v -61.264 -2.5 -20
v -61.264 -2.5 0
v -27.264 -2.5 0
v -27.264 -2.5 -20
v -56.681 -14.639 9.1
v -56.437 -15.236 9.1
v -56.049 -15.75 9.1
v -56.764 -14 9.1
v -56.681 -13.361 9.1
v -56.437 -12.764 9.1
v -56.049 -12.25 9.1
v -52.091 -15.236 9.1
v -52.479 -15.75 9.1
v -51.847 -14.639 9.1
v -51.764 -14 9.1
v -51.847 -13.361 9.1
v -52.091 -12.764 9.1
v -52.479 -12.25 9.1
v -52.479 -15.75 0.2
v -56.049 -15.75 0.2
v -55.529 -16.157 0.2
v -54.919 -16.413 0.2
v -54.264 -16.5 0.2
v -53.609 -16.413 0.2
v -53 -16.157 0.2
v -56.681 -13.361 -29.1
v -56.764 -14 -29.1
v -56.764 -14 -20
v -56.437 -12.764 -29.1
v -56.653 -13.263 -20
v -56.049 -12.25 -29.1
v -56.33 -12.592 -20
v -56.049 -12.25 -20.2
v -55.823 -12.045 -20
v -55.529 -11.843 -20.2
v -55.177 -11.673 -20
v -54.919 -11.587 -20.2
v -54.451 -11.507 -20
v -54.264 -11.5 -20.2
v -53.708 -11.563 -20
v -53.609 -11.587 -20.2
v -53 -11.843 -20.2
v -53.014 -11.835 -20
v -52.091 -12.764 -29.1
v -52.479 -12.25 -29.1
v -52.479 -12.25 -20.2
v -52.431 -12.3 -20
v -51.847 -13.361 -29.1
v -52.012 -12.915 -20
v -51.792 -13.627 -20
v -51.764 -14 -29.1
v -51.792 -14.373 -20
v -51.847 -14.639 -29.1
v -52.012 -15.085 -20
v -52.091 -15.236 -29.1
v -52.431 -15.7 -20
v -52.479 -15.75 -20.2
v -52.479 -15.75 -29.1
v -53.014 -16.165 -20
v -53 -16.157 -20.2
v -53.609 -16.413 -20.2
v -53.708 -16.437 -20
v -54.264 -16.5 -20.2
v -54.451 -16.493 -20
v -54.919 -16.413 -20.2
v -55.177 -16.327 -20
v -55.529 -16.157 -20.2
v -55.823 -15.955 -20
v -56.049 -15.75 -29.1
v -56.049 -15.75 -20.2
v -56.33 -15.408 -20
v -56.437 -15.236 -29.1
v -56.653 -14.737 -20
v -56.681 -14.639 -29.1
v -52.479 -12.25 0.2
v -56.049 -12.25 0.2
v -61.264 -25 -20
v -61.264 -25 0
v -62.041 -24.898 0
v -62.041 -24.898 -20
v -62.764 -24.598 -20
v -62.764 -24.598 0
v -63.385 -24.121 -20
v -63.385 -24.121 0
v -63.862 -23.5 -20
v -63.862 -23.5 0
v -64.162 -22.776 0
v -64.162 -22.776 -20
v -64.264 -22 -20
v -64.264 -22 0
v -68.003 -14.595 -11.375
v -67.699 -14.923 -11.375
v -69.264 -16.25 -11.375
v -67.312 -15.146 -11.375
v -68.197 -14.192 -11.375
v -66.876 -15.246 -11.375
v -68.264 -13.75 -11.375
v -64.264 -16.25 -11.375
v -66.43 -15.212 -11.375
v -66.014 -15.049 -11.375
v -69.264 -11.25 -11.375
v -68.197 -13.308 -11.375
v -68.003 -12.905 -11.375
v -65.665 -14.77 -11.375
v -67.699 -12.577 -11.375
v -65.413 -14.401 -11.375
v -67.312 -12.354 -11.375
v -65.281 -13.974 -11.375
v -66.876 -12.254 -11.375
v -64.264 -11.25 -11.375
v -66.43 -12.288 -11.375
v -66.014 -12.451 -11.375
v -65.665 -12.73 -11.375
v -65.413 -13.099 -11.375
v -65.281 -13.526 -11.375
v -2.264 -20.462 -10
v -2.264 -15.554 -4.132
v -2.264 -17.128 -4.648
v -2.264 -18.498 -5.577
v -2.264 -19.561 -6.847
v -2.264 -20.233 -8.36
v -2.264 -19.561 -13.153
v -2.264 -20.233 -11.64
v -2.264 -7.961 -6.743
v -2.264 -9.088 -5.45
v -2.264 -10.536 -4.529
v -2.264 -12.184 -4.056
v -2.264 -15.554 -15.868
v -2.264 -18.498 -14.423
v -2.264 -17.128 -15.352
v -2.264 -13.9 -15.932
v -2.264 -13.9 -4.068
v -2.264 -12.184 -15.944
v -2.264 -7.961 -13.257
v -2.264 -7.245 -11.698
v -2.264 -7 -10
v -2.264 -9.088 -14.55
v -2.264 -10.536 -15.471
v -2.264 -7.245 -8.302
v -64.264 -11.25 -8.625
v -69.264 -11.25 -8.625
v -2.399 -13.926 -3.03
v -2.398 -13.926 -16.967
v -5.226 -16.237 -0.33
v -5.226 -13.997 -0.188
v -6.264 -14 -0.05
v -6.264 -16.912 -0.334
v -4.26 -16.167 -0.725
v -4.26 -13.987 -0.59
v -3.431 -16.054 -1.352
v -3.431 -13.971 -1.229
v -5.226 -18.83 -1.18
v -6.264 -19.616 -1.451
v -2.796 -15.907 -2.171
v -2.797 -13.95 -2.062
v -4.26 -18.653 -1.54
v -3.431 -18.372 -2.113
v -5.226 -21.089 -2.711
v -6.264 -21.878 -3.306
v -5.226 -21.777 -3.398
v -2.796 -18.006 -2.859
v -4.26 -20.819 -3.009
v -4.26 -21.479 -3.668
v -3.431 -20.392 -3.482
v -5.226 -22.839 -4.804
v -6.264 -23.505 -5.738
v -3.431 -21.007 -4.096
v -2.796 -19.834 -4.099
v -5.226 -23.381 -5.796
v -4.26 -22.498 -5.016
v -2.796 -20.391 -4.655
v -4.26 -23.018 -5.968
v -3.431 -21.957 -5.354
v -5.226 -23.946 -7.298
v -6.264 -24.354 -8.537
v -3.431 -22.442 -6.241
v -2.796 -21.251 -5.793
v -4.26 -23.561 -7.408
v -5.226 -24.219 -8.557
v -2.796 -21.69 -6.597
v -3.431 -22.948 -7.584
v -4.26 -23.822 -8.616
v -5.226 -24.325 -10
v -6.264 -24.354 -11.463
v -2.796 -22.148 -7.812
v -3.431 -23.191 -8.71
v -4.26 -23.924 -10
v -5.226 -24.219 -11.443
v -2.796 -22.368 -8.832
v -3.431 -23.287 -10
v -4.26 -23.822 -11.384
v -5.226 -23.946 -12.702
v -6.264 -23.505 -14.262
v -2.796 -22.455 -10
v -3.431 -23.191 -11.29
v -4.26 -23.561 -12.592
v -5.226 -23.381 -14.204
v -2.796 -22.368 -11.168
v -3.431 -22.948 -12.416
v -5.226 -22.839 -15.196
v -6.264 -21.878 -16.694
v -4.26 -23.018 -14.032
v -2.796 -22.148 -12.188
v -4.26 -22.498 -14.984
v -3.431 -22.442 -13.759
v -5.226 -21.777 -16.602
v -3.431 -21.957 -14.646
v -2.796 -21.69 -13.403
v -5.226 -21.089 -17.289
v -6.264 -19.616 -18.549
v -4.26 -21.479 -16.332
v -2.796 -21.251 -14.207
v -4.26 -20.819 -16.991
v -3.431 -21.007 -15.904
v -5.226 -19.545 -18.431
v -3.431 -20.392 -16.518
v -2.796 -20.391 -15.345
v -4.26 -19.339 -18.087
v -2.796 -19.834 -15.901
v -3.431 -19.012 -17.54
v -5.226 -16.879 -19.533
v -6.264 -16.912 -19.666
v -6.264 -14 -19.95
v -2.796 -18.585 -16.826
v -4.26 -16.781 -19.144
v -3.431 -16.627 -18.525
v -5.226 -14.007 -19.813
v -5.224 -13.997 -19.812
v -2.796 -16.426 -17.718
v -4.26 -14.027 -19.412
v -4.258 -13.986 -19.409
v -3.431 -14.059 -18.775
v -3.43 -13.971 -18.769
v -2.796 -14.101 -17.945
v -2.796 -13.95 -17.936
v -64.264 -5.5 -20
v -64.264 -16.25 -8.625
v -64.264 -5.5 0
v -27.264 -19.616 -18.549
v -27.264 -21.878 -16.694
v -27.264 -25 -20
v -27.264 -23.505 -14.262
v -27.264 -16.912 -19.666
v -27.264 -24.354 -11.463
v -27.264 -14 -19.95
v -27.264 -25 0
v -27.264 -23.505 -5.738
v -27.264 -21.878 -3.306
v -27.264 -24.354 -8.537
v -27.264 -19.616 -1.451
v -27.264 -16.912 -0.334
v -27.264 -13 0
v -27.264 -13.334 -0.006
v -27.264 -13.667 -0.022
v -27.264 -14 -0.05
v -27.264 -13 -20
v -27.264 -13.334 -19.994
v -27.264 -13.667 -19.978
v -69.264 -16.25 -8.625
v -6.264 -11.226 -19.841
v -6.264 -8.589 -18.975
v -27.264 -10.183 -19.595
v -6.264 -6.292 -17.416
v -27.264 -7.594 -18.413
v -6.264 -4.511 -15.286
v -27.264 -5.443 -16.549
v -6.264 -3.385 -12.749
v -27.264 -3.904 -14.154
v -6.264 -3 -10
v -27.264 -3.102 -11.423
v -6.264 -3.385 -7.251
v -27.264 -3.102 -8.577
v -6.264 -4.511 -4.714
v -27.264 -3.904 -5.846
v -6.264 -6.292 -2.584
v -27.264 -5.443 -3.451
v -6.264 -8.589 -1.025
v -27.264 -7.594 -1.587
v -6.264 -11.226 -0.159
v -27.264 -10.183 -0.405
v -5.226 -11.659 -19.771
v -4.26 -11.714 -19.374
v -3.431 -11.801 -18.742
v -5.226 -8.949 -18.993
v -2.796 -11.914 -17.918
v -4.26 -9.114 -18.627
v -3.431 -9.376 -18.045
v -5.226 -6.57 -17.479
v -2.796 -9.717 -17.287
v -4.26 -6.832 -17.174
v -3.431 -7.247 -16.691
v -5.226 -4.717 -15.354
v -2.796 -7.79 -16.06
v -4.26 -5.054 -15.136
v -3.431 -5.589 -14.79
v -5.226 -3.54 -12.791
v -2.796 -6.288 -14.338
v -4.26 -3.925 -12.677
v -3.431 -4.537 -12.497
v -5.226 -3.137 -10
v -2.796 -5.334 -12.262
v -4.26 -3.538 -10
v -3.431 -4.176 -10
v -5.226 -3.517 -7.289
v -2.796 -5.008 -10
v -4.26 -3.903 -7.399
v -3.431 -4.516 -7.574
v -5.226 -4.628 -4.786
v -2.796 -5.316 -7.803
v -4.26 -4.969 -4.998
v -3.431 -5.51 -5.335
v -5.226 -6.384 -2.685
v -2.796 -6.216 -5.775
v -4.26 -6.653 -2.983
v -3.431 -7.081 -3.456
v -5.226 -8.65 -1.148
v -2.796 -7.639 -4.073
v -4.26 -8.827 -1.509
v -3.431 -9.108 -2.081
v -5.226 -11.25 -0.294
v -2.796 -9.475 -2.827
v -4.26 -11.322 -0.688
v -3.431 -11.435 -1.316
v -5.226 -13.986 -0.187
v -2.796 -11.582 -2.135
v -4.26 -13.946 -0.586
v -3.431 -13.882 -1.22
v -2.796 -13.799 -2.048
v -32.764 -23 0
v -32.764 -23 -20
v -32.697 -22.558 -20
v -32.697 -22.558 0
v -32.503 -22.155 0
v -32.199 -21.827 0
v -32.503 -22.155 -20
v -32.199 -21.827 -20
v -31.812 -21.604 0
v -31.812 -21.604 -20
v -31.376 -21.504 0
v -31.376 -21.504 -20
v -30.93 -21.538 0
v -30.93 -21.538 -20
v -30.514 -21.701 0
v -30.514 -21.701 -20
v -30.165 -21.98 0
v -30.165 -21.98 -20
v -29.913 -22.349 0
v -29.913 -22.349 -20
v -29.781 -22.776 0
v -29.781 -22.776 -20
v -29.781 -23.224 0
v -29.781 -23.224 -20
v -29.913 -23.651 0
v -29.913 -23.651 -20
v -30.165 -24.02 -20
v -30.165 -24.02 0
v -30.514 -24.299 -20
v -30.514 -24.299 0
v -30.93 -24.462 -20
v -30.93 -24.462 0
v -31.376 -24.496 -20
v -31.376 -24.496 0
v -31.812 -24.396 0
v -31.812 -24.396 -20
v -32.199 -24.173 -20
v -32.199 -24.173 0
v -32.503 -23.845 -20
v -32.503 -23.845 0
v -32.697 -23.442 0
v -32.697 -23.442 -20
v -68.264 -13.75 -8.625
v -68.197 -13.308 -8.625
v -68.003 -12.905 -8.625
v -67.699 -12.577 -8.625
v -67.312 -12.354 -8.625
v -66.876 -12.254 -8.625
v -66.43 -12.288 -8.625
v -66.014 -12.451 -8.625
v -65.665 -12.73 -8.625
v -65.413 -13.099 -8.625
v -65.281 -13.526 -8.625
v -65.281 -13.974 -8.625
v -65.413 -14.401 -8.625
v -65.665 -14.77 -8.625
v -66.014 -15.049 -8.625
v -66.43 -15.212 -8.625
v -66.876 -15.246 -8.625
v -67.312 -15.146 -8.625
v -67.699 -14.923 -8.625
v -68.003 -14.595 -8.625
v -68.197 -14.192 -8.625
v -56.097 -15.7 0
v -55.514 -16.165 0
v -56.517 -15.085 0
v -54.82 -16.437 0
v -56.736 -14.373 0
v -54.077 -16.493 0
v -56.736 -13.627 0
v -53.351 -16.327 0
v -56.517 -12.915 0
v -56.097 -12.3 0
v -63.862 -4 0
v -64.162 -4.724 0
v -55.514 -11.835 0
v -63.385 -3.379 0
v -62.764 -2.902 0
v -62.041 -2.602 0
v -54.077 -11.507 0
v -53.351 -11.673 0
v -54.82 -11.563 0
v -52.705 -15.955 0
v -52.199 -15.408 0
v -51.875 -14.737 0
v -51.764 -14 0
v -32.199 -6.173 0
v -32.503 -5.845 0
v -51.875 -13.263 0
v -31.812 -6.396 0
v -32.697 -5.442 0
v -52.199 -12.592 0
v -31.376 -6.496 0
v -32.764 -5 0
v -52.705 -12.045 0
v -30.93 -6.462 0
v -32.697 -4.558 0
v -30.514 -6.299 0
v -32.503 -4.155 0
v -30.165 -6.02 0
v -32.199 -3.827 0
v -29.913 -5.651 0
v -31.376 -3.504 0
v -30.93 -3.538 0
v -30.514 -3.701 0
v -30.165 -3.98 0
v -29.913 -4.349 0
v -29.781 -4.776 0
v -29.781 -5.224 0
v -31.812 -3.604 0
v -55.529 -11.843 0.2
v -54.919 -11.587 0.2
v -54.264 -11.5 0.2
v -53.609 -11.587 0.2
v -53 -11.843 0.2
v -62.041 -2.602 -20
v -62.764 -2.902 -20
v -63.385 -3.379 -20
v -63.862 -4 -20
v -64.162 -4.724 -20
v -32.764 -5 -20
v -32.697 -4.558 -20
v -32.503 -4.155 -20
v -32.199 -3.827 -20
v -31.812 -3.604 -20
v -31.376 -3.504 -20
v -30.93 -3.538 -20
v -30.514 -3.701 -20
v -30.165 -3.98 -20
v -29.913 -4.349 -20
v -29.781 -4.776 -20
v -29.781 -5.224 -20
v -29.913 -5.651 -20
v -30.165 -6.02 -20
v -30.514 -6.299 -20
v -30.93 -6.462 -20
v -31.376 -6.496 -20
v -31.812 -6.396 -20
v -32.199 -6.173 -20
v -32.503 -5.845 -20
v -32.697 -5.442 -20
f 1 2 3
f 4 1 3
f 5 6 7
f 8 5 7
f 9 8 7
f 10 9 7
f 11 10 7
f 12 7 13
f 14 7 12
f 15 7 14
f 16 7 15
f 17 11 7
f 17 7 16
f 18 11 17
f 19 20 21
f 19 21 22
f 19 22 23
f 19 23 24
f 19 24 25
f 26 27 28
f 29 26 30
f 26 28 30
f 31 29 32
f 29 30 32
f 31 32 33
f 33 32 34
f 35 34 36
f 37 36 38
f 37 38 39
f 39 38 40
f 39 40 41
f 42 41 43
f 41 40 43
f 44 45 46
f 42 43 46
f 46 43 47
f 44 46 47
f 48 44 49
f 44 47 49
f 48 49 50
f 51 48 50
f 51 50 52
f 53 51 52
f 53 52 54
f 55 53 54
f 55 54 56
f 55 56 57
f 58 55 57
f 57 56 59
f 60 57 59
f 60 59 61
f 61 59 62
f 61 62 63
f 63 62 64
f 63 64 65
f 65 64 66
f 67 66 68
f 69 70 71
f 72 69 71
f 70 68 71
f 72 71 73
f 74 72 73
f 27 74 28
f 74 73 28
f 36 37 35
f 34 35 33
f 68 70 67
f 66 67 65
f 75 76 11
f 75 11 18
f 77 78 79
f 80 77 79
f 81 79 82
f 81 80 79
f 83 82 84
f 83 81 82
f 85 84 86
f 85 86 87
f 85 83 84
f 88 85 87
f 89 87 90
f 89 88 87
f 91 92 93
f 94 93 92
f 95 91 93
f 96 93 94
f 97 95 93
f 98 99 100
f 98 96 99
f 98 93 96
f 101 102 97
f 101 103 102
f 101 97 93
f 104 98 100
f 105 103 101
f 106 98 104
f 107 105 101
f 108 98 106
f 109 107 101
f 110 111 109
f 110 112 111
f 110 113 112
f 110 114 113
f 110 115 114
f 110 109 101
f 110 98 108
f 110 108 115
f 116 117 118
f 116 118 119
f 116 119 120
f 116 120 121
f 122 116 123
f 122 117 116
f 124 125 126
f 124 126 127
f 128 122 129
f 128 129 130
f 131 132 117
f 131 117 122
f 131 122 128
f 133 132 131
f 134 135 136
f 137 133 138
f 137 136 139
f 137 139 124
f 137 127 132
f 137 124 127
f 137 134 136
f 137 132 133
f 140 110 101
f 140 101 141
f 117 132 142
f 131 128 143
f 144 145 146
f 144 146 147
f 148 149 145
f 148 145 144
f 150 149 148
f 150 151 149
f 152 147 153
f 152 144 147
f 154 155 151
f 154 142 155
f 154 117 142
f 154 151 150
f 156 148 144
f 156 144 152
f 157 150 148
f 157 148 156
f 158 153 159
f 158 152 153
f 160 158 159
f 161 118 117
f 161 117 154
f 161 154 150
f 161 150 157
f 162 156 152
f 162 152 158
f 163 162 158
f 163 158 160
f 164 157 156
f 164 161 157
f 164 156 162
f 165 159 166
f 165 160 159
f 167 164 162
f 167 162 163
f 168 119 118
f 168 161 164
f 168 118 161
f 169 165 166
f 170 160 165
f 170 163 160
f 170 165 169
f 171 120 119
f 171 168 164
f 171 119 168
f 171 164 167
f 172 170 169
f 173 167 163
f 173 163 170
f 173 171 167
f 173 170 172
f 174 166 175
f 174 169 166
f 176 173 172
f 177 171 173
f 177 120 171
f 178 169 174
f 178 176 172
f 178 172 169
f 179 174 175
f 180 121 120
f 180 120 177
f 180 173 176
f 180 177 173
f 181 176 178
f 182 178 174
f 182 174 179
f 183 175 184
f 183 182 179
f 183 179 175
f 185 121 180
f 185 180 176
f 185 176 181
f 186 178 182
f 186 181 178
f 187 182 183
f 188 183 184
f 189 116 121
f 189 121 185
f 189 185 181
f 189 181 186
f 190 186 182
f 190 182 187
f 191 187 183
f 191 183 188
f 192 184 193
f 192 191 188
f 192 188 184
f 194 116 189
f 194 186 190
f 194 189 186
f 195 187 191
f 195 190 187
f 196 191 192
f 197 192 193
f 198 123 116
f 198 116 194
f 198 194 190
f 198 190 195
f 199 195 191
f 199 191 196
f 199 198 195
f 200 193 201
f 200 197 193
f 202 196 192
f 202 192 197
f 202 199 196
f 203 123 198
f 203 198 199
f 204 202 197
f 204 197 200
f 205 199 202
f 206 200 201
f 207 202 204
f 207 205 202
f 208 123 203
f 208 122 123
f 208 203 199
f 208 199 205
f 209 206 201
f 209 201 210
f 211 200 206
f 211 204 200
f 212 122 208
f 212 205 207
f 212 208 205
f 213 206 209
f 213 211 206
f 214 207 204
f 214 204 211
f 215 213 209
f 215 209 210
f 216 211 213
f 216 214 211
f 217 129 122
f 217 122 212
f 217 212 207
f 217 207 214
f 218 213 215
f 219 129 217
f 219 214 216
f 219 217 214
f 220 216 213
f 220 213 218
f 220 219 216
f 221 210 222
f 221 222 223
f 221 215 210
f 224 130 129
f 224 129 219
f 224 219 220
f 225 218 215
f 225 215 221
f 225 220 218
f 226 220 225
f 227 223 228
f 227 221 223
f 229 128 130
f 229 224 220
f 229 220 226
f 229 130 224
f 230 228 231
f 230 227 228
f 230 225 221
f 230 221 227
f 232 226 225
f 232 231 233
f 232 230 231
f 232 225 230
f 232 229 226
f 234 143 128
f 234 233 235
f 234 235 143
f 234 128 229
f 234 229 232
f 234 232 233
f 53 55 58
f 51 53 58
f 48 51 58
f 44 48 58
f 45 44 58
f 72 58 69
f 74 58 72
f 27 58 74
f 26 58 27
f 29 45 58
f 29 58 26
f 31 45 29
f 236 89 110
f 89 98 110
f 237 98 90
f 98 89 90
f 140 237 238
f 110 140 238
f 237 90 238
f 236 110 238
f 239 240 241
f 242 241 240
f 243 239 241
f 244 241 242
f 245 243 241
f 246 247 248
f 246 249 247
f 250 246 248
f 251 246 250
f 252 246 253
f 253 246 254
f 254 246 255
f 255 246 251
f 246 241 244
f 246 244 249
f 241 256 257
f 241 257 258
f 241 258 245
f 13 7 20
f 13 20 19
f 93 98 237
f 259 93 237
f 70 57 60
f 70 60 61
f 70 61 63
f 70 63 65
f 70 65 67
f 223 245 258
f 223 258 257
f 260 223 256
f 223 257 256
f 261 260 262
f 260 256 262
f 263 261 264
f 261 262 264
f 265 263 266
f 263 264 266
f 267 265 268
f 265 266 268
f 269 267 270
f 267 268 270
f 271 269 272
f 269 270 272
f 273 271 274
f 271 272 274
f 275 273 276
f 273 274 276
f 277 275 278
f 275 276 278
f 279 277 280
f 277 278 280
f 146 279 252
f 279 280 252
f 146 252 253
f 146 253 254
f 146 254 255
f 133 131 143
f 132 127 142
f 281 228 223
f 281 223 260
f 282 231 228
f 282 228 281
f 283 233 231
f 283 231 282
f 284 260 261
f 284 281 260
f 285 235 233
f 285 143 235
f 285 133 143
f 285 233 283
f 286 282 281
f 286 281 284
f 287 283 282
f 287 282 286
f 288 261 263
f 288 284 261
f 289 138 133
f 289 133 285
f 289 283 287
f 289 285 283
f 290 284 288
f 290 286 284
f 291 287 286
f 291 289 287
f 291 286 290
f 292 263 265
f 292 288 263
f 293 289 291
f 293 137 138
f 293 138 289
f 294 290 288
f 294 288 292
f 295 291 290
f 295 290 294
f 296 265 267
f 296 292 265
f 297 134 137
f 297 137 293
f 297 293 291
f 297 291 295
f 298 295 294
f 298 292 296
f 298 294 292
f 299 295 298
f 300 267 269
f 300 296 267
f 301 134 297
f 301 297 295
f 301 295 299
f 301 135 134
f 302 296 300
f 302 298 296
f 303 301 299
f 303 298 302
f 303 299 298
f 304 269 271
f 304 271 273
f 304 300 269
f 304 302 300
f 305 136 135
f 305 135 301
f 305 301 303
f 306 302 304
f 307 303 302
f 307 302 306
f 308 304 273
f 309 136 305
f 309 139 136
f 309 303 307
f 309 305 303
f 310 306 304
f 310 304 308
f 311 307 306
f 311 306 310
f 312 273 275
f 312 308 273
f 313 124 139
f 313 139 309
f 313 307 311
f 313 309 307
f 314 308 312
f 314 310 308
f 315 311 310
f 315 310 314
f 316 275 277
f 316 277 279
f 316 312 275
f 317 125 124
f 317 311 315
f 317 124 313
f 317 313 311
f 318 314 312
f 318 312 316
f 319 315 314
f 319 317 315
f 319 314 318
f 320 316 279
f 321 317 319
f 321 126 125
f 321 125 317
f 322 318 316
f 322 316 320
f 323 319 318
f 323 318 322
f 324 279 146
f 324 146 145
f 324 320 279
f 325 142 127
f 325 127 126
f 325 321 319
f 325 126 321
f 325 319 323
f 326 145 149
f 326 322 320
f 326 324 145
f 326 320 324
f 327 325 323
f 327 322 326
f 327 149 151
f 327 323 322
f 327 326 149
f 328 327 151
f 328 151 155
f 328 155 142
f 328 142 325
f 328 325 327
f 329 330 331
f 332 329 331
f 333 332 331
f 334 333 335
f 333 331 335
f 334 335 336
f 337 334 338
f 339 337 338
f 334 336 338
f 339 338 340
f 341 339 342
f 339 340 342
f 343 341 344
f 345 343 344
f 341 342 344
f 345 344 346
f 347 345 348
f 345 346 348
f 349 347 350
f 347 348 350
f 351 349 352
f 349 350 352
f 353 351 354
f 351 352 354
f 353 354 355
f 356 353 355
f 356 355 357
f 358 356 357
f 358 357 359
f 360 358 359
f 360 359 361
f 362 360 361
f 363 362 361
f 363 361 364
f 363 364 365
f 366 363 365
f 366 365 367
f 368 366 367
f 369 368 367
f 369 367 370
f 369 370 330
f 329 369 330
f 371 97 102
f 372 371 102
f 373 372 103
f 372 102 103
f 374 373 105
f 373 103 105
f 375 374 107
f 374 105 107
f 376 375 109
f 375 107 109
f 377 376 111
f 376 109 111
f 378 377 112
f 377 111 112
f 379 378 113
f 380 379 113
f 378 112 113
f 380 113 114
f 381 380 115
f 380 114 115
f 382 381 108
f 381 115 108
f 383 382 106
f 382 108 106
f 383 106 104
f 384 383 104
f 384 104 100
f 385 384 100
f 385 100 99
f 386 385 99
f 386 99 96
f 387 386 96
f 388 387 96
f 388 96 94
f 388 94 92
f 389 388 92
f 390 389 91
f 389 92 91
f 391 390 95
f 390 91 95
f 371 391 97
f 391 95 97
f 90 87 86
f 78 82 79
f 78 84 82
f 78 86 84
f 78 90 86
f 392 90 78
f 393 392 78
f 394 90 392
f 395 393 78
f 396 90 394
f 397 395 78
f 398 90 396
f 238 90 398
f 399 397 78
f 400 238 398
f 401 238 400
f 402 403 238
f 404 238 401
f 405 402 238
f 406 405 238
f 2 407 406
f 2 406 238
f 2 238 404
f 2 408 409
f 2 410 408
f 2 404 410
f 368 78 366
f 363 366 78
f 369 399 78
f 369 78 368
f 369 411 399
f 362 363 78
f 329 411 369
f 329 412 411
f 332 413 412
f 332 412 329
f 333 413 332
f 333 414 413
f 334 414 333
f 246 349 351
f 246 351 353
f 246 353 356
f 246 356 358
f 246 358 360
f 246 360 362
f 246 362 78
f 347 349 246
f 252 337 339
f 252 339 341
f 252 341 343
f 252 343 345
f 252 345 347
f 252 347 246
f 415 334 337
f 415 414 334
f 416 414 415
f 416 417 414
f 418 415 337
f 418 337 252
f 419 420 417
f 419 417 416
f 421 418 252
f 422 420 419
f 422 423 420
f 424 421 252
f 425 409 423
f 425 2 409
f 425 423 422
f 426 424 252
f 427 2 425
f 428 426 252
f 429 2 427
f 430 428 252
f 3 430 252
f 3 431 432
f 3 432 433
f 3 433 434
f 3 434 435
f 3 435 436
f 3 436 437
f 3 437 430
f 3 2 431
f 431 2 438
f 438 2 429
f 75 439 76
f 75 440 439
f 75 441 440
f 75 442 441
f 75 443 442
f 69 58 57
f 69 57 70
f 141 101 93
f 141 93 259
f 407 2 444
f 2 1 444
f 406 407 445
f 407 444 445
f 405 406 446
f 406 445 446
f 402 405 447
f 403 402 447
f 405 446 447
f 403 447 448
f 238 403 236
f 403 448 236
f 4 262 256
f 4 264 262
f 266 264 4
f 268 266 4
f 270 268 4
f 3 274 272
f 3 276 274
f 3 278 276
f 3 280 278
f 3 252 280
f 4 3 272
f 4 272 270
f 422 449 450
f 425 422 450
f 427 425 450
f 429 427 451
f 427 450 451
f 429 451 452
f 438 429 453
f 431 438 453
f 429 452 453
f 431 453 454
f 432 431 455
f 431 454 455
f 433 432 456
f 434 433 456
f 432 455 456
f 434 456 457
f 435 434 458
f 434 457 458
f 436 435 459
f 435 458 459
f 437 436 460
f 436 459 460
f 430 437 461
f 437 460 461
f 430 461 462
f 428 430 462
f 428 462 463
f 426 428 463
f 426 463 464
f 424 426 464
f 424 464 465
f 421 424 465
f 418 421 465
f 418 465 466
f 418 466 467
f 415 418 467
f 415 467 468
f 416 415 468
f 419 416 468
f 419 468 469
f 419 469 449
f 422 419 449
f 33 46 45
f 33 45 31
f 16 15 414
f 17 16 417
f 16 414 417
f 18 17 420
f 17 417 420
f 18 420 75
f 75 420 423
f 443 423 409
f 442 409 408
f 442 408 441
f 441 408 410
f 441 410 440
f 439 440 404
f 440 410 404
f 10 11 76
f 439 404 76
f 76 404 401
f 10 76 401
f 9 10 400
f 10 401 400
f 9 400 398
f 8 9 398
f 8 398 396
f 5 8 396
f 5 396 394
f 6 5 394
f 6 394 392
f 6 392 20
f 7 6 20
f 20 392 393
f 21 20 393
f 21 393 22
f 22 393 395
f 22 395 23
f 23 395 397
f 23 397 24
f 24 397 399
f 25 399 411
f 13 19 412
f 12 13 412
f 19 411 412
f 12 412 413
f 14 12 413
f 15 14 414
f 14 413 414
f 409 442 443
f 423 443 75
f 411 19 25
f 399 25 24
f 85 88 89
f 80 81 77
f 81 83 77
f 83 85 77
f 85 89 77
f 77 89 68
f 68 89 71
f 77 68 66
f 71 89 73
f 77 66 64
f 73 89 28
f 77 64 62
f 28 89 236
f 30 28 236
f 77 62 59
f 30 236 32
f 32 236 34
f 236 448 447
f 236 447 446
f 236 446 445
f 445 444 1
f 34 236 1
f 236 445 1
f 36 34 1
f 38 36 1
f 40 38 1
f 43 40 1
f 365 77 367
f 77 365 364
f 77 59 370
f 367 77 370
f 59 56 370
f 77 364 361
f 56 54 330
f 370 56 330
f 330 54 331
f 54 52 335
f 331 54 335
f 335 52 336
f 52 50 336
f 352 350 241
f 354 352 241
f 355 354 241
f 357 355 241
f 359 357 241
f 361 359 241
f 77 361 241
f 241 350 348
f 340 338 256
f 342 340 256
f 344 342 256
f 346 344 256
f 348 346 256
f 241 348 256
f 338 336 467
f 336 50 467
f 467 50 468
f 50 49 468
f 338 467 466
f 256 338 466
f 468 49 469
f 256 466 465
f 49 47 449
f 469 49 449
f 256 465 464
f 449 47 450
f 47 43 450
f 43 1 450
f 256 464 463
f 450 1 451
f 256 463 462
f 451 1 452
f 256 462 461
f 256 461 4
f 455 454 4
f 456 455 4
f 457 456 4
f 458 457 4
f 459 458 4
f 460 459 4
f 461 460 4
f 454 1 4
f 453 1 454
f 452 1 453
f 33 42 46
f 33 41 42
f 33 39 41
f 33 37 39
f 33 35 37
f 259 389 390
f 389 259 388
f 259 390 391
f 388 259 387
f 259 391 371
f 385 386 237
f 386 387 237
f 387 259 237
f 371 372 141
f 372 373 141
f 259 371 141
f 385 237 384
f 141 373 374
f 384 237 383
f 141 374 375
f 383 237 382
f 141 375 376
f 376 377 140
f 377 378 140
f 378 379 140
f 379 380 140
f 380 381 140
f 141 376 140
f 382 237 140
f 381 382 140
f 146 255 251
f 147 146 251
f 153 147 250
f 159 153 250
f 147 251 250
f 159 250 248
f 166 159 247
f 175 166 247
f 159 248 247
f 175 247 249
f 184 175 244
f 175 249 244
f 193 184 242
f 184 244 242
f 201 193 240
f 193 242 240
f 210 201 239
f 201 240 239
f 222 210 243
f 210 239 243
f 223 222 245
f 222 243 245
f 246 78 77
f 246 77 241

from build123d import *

# Parameters (mm, degrees)
SKETCH1_W           = 37
SKETCH1_H           = 22.5
BOSS_EXTRUDE1_DEPTH = 20
BOSS_EXTRUDE2_DEPTH = 25
SKETCH3_R           = 2.5
BOSS_EXTRUDE3_DEPTH = 9.1
SKETCH4_R           = 2.5
BOSS_EXTRUDE4_DEPTH = 9.1
FILLET1_R           = 3
FILLET2_R           = 4
SKETCH5_W           = 2.75
SKETCH5_H           = 5
BOSS_EXTRUDE5_DEPTH = 5
SKETCH6_R           = 1.5
CUT_EXTRUDE1_DEPTH  = 2.75
SKETCH7_R           = 1.5
CUT_EXTRUDE2_DEPTH  = 30.1
SKETCH8_W           = 8.509980697
SKETCH8_H           = 2.764975678
SKETCH8_W_2         = 9.677414873
SKETCH8_H_2         = 2.427034206
CUT_EXTRUDE3_DEPTH  = 8.9
SKETCH9_W           = 9.677414873
SKETCH9_H           = 2.427034206
SKETCH9_W_2         = 8.509980697
SKETCH9_H_2         = 2.764975678
CUT_EXTRUDE4_DEPTH  = 8.9


with BuildPart() as part:
    # Sketch1 → Boss-Extrude1 (new body)
    with BuildSketch(Plane.XY):
        with Locations((-45.764100782, -13.75)):
            Rectangle(SKETCH1_W, SKETCH1_H)
    extrude(amount=-BOSS_EXTRUDE1_DEPTH)

    # Sketch2 → Boss-Extrude2 (add)
    with BuildSketch(Plane(origin=(-27.264100782, 0, 0), x_dir=(0, 0, -1), z_dir=(1, 0, 0))):
        with BuildLine():
            ThreePointArc((0.050125629, -14), (10, -24.462429423), (19.949874371, -14))
            ThreePointArc((19.949874371, -14), (10, -3), (0.050125629, -14))
        make_face()
    extrude(amount=BOSS_EXTRUDE2_DEPTH)

    # Sketch3 → Boss-Extrude3 (add)
    with BuildSketch(Plane.XY):
        with Locations((-54.264100782, -14)):
            Circle(SKETCH3_R)
    extrude(amount=BOSS_EXTRUDE3_DEPTH)

    # Sketch4 → Boss-Extrude4 (add)
    with BuildSketch(Plane(origin=(0, 0, -20), x_dir=(-1, 0, 0), z_dir=(0, 0, -1))):
        with Locations((54.264100782, -14)):
            Circle(SKETCH4_R)
    extrude(amount=BOSS_EXTRUDE4_DEPTH)

    # Fillet1
    fillet1_edges = [part.edges().sort_by_distance(p)[0] for p in [
        (-64.264100782, -2.5, -10),
        (-64.264100782, -25, -10),
    ]]
    fillet(fillet1_edges, radius=FILLET1_R)

    # Fillet2
    fillet2_edges = [part.edges().sort_by_distance(p)[0] for p in [
        (-2.264100782, -3, -10),
        (-2.264100782, -24.462429423, -10),
    ]]
    fillet(fillet2_edges, radius=FILLET2_R)

    # Sketch5 → Boss-Extrude5 (add)
    with BuildSketch(Plane.ZY.offset(64.264100782)):
        with Locations((-10, -13.75)):
            Rectangle(SKETCH5_W, SKETCH5_H)
    extrude(amount=BOSS_EXTRUDE5_DEPTH)

    # Sketch6 → Cut-Extrude1 (cut)
    with BuildSketch(Plane(origin=(0, 0, -11.375), x_dir=(-1, 0, 0), z_dir=(0, 0, -1))):
        with Locations((66.764100782, -13.75)):
            Circle(SKETCH6_R)
    extrude(amount=-CUT_EXTRUDE1_DEPTH, mode=Mode.SUBTRACT)

    # Sketch7 → Cut-Extrude2 (cut, through all)
    with BuildSketch(Plane(origin=(0, 0, -20), x_dir=(-1, 0, 0), z_dir=(0, 0, -1))):
        with Locations((31.264100782, -5)):
            Circle(SKETCH7_R)
        with Locations((31.264100782, -23)):
            Circle(SKETCH7_R)
    extrude(amount=-CUT_EXTRUDE2_DEPTH, mode=Mode.SUBTRACT)

    # Sketch8 → Cut-Extrude3 (cut)
    with BuildSketch(Plane(origin=(0, 0, -29.1), x_dir=(-1, 0, 0), z_dir=(0, 0, -1))):
        with Locations((54.477604306, -17.132487839)):
            Rectangle(SKETCH8_W, SKETCH8_H)
        with Locations((54.323994545, -11.036482897)):
            Rectangle(SKETCH8_W_2, SKETCH8_H_2)
    extrude(amount=-CUT_EXTRUDE3_DEPTH, mode=Mode.SUBTRACT)

    # Sketch9 → Cut-Extrude4 (cut)
    with BuildSketch(Plane.XY.offset(9.1)):
        with Locations((-54.323994545, -11.036482897)):
            Rectangle(SKETCH9_W, SKETCH9_H)
        with Locations((-54.477604306, -17.132487839)):
            Rectangle(SKETCH9_W_2, SKETCH9_H_2)
    extrude(amount=-CUT_EXTRUDE4_DEPTH, mode=Mode.SUBTRACT)


solid = part.part
